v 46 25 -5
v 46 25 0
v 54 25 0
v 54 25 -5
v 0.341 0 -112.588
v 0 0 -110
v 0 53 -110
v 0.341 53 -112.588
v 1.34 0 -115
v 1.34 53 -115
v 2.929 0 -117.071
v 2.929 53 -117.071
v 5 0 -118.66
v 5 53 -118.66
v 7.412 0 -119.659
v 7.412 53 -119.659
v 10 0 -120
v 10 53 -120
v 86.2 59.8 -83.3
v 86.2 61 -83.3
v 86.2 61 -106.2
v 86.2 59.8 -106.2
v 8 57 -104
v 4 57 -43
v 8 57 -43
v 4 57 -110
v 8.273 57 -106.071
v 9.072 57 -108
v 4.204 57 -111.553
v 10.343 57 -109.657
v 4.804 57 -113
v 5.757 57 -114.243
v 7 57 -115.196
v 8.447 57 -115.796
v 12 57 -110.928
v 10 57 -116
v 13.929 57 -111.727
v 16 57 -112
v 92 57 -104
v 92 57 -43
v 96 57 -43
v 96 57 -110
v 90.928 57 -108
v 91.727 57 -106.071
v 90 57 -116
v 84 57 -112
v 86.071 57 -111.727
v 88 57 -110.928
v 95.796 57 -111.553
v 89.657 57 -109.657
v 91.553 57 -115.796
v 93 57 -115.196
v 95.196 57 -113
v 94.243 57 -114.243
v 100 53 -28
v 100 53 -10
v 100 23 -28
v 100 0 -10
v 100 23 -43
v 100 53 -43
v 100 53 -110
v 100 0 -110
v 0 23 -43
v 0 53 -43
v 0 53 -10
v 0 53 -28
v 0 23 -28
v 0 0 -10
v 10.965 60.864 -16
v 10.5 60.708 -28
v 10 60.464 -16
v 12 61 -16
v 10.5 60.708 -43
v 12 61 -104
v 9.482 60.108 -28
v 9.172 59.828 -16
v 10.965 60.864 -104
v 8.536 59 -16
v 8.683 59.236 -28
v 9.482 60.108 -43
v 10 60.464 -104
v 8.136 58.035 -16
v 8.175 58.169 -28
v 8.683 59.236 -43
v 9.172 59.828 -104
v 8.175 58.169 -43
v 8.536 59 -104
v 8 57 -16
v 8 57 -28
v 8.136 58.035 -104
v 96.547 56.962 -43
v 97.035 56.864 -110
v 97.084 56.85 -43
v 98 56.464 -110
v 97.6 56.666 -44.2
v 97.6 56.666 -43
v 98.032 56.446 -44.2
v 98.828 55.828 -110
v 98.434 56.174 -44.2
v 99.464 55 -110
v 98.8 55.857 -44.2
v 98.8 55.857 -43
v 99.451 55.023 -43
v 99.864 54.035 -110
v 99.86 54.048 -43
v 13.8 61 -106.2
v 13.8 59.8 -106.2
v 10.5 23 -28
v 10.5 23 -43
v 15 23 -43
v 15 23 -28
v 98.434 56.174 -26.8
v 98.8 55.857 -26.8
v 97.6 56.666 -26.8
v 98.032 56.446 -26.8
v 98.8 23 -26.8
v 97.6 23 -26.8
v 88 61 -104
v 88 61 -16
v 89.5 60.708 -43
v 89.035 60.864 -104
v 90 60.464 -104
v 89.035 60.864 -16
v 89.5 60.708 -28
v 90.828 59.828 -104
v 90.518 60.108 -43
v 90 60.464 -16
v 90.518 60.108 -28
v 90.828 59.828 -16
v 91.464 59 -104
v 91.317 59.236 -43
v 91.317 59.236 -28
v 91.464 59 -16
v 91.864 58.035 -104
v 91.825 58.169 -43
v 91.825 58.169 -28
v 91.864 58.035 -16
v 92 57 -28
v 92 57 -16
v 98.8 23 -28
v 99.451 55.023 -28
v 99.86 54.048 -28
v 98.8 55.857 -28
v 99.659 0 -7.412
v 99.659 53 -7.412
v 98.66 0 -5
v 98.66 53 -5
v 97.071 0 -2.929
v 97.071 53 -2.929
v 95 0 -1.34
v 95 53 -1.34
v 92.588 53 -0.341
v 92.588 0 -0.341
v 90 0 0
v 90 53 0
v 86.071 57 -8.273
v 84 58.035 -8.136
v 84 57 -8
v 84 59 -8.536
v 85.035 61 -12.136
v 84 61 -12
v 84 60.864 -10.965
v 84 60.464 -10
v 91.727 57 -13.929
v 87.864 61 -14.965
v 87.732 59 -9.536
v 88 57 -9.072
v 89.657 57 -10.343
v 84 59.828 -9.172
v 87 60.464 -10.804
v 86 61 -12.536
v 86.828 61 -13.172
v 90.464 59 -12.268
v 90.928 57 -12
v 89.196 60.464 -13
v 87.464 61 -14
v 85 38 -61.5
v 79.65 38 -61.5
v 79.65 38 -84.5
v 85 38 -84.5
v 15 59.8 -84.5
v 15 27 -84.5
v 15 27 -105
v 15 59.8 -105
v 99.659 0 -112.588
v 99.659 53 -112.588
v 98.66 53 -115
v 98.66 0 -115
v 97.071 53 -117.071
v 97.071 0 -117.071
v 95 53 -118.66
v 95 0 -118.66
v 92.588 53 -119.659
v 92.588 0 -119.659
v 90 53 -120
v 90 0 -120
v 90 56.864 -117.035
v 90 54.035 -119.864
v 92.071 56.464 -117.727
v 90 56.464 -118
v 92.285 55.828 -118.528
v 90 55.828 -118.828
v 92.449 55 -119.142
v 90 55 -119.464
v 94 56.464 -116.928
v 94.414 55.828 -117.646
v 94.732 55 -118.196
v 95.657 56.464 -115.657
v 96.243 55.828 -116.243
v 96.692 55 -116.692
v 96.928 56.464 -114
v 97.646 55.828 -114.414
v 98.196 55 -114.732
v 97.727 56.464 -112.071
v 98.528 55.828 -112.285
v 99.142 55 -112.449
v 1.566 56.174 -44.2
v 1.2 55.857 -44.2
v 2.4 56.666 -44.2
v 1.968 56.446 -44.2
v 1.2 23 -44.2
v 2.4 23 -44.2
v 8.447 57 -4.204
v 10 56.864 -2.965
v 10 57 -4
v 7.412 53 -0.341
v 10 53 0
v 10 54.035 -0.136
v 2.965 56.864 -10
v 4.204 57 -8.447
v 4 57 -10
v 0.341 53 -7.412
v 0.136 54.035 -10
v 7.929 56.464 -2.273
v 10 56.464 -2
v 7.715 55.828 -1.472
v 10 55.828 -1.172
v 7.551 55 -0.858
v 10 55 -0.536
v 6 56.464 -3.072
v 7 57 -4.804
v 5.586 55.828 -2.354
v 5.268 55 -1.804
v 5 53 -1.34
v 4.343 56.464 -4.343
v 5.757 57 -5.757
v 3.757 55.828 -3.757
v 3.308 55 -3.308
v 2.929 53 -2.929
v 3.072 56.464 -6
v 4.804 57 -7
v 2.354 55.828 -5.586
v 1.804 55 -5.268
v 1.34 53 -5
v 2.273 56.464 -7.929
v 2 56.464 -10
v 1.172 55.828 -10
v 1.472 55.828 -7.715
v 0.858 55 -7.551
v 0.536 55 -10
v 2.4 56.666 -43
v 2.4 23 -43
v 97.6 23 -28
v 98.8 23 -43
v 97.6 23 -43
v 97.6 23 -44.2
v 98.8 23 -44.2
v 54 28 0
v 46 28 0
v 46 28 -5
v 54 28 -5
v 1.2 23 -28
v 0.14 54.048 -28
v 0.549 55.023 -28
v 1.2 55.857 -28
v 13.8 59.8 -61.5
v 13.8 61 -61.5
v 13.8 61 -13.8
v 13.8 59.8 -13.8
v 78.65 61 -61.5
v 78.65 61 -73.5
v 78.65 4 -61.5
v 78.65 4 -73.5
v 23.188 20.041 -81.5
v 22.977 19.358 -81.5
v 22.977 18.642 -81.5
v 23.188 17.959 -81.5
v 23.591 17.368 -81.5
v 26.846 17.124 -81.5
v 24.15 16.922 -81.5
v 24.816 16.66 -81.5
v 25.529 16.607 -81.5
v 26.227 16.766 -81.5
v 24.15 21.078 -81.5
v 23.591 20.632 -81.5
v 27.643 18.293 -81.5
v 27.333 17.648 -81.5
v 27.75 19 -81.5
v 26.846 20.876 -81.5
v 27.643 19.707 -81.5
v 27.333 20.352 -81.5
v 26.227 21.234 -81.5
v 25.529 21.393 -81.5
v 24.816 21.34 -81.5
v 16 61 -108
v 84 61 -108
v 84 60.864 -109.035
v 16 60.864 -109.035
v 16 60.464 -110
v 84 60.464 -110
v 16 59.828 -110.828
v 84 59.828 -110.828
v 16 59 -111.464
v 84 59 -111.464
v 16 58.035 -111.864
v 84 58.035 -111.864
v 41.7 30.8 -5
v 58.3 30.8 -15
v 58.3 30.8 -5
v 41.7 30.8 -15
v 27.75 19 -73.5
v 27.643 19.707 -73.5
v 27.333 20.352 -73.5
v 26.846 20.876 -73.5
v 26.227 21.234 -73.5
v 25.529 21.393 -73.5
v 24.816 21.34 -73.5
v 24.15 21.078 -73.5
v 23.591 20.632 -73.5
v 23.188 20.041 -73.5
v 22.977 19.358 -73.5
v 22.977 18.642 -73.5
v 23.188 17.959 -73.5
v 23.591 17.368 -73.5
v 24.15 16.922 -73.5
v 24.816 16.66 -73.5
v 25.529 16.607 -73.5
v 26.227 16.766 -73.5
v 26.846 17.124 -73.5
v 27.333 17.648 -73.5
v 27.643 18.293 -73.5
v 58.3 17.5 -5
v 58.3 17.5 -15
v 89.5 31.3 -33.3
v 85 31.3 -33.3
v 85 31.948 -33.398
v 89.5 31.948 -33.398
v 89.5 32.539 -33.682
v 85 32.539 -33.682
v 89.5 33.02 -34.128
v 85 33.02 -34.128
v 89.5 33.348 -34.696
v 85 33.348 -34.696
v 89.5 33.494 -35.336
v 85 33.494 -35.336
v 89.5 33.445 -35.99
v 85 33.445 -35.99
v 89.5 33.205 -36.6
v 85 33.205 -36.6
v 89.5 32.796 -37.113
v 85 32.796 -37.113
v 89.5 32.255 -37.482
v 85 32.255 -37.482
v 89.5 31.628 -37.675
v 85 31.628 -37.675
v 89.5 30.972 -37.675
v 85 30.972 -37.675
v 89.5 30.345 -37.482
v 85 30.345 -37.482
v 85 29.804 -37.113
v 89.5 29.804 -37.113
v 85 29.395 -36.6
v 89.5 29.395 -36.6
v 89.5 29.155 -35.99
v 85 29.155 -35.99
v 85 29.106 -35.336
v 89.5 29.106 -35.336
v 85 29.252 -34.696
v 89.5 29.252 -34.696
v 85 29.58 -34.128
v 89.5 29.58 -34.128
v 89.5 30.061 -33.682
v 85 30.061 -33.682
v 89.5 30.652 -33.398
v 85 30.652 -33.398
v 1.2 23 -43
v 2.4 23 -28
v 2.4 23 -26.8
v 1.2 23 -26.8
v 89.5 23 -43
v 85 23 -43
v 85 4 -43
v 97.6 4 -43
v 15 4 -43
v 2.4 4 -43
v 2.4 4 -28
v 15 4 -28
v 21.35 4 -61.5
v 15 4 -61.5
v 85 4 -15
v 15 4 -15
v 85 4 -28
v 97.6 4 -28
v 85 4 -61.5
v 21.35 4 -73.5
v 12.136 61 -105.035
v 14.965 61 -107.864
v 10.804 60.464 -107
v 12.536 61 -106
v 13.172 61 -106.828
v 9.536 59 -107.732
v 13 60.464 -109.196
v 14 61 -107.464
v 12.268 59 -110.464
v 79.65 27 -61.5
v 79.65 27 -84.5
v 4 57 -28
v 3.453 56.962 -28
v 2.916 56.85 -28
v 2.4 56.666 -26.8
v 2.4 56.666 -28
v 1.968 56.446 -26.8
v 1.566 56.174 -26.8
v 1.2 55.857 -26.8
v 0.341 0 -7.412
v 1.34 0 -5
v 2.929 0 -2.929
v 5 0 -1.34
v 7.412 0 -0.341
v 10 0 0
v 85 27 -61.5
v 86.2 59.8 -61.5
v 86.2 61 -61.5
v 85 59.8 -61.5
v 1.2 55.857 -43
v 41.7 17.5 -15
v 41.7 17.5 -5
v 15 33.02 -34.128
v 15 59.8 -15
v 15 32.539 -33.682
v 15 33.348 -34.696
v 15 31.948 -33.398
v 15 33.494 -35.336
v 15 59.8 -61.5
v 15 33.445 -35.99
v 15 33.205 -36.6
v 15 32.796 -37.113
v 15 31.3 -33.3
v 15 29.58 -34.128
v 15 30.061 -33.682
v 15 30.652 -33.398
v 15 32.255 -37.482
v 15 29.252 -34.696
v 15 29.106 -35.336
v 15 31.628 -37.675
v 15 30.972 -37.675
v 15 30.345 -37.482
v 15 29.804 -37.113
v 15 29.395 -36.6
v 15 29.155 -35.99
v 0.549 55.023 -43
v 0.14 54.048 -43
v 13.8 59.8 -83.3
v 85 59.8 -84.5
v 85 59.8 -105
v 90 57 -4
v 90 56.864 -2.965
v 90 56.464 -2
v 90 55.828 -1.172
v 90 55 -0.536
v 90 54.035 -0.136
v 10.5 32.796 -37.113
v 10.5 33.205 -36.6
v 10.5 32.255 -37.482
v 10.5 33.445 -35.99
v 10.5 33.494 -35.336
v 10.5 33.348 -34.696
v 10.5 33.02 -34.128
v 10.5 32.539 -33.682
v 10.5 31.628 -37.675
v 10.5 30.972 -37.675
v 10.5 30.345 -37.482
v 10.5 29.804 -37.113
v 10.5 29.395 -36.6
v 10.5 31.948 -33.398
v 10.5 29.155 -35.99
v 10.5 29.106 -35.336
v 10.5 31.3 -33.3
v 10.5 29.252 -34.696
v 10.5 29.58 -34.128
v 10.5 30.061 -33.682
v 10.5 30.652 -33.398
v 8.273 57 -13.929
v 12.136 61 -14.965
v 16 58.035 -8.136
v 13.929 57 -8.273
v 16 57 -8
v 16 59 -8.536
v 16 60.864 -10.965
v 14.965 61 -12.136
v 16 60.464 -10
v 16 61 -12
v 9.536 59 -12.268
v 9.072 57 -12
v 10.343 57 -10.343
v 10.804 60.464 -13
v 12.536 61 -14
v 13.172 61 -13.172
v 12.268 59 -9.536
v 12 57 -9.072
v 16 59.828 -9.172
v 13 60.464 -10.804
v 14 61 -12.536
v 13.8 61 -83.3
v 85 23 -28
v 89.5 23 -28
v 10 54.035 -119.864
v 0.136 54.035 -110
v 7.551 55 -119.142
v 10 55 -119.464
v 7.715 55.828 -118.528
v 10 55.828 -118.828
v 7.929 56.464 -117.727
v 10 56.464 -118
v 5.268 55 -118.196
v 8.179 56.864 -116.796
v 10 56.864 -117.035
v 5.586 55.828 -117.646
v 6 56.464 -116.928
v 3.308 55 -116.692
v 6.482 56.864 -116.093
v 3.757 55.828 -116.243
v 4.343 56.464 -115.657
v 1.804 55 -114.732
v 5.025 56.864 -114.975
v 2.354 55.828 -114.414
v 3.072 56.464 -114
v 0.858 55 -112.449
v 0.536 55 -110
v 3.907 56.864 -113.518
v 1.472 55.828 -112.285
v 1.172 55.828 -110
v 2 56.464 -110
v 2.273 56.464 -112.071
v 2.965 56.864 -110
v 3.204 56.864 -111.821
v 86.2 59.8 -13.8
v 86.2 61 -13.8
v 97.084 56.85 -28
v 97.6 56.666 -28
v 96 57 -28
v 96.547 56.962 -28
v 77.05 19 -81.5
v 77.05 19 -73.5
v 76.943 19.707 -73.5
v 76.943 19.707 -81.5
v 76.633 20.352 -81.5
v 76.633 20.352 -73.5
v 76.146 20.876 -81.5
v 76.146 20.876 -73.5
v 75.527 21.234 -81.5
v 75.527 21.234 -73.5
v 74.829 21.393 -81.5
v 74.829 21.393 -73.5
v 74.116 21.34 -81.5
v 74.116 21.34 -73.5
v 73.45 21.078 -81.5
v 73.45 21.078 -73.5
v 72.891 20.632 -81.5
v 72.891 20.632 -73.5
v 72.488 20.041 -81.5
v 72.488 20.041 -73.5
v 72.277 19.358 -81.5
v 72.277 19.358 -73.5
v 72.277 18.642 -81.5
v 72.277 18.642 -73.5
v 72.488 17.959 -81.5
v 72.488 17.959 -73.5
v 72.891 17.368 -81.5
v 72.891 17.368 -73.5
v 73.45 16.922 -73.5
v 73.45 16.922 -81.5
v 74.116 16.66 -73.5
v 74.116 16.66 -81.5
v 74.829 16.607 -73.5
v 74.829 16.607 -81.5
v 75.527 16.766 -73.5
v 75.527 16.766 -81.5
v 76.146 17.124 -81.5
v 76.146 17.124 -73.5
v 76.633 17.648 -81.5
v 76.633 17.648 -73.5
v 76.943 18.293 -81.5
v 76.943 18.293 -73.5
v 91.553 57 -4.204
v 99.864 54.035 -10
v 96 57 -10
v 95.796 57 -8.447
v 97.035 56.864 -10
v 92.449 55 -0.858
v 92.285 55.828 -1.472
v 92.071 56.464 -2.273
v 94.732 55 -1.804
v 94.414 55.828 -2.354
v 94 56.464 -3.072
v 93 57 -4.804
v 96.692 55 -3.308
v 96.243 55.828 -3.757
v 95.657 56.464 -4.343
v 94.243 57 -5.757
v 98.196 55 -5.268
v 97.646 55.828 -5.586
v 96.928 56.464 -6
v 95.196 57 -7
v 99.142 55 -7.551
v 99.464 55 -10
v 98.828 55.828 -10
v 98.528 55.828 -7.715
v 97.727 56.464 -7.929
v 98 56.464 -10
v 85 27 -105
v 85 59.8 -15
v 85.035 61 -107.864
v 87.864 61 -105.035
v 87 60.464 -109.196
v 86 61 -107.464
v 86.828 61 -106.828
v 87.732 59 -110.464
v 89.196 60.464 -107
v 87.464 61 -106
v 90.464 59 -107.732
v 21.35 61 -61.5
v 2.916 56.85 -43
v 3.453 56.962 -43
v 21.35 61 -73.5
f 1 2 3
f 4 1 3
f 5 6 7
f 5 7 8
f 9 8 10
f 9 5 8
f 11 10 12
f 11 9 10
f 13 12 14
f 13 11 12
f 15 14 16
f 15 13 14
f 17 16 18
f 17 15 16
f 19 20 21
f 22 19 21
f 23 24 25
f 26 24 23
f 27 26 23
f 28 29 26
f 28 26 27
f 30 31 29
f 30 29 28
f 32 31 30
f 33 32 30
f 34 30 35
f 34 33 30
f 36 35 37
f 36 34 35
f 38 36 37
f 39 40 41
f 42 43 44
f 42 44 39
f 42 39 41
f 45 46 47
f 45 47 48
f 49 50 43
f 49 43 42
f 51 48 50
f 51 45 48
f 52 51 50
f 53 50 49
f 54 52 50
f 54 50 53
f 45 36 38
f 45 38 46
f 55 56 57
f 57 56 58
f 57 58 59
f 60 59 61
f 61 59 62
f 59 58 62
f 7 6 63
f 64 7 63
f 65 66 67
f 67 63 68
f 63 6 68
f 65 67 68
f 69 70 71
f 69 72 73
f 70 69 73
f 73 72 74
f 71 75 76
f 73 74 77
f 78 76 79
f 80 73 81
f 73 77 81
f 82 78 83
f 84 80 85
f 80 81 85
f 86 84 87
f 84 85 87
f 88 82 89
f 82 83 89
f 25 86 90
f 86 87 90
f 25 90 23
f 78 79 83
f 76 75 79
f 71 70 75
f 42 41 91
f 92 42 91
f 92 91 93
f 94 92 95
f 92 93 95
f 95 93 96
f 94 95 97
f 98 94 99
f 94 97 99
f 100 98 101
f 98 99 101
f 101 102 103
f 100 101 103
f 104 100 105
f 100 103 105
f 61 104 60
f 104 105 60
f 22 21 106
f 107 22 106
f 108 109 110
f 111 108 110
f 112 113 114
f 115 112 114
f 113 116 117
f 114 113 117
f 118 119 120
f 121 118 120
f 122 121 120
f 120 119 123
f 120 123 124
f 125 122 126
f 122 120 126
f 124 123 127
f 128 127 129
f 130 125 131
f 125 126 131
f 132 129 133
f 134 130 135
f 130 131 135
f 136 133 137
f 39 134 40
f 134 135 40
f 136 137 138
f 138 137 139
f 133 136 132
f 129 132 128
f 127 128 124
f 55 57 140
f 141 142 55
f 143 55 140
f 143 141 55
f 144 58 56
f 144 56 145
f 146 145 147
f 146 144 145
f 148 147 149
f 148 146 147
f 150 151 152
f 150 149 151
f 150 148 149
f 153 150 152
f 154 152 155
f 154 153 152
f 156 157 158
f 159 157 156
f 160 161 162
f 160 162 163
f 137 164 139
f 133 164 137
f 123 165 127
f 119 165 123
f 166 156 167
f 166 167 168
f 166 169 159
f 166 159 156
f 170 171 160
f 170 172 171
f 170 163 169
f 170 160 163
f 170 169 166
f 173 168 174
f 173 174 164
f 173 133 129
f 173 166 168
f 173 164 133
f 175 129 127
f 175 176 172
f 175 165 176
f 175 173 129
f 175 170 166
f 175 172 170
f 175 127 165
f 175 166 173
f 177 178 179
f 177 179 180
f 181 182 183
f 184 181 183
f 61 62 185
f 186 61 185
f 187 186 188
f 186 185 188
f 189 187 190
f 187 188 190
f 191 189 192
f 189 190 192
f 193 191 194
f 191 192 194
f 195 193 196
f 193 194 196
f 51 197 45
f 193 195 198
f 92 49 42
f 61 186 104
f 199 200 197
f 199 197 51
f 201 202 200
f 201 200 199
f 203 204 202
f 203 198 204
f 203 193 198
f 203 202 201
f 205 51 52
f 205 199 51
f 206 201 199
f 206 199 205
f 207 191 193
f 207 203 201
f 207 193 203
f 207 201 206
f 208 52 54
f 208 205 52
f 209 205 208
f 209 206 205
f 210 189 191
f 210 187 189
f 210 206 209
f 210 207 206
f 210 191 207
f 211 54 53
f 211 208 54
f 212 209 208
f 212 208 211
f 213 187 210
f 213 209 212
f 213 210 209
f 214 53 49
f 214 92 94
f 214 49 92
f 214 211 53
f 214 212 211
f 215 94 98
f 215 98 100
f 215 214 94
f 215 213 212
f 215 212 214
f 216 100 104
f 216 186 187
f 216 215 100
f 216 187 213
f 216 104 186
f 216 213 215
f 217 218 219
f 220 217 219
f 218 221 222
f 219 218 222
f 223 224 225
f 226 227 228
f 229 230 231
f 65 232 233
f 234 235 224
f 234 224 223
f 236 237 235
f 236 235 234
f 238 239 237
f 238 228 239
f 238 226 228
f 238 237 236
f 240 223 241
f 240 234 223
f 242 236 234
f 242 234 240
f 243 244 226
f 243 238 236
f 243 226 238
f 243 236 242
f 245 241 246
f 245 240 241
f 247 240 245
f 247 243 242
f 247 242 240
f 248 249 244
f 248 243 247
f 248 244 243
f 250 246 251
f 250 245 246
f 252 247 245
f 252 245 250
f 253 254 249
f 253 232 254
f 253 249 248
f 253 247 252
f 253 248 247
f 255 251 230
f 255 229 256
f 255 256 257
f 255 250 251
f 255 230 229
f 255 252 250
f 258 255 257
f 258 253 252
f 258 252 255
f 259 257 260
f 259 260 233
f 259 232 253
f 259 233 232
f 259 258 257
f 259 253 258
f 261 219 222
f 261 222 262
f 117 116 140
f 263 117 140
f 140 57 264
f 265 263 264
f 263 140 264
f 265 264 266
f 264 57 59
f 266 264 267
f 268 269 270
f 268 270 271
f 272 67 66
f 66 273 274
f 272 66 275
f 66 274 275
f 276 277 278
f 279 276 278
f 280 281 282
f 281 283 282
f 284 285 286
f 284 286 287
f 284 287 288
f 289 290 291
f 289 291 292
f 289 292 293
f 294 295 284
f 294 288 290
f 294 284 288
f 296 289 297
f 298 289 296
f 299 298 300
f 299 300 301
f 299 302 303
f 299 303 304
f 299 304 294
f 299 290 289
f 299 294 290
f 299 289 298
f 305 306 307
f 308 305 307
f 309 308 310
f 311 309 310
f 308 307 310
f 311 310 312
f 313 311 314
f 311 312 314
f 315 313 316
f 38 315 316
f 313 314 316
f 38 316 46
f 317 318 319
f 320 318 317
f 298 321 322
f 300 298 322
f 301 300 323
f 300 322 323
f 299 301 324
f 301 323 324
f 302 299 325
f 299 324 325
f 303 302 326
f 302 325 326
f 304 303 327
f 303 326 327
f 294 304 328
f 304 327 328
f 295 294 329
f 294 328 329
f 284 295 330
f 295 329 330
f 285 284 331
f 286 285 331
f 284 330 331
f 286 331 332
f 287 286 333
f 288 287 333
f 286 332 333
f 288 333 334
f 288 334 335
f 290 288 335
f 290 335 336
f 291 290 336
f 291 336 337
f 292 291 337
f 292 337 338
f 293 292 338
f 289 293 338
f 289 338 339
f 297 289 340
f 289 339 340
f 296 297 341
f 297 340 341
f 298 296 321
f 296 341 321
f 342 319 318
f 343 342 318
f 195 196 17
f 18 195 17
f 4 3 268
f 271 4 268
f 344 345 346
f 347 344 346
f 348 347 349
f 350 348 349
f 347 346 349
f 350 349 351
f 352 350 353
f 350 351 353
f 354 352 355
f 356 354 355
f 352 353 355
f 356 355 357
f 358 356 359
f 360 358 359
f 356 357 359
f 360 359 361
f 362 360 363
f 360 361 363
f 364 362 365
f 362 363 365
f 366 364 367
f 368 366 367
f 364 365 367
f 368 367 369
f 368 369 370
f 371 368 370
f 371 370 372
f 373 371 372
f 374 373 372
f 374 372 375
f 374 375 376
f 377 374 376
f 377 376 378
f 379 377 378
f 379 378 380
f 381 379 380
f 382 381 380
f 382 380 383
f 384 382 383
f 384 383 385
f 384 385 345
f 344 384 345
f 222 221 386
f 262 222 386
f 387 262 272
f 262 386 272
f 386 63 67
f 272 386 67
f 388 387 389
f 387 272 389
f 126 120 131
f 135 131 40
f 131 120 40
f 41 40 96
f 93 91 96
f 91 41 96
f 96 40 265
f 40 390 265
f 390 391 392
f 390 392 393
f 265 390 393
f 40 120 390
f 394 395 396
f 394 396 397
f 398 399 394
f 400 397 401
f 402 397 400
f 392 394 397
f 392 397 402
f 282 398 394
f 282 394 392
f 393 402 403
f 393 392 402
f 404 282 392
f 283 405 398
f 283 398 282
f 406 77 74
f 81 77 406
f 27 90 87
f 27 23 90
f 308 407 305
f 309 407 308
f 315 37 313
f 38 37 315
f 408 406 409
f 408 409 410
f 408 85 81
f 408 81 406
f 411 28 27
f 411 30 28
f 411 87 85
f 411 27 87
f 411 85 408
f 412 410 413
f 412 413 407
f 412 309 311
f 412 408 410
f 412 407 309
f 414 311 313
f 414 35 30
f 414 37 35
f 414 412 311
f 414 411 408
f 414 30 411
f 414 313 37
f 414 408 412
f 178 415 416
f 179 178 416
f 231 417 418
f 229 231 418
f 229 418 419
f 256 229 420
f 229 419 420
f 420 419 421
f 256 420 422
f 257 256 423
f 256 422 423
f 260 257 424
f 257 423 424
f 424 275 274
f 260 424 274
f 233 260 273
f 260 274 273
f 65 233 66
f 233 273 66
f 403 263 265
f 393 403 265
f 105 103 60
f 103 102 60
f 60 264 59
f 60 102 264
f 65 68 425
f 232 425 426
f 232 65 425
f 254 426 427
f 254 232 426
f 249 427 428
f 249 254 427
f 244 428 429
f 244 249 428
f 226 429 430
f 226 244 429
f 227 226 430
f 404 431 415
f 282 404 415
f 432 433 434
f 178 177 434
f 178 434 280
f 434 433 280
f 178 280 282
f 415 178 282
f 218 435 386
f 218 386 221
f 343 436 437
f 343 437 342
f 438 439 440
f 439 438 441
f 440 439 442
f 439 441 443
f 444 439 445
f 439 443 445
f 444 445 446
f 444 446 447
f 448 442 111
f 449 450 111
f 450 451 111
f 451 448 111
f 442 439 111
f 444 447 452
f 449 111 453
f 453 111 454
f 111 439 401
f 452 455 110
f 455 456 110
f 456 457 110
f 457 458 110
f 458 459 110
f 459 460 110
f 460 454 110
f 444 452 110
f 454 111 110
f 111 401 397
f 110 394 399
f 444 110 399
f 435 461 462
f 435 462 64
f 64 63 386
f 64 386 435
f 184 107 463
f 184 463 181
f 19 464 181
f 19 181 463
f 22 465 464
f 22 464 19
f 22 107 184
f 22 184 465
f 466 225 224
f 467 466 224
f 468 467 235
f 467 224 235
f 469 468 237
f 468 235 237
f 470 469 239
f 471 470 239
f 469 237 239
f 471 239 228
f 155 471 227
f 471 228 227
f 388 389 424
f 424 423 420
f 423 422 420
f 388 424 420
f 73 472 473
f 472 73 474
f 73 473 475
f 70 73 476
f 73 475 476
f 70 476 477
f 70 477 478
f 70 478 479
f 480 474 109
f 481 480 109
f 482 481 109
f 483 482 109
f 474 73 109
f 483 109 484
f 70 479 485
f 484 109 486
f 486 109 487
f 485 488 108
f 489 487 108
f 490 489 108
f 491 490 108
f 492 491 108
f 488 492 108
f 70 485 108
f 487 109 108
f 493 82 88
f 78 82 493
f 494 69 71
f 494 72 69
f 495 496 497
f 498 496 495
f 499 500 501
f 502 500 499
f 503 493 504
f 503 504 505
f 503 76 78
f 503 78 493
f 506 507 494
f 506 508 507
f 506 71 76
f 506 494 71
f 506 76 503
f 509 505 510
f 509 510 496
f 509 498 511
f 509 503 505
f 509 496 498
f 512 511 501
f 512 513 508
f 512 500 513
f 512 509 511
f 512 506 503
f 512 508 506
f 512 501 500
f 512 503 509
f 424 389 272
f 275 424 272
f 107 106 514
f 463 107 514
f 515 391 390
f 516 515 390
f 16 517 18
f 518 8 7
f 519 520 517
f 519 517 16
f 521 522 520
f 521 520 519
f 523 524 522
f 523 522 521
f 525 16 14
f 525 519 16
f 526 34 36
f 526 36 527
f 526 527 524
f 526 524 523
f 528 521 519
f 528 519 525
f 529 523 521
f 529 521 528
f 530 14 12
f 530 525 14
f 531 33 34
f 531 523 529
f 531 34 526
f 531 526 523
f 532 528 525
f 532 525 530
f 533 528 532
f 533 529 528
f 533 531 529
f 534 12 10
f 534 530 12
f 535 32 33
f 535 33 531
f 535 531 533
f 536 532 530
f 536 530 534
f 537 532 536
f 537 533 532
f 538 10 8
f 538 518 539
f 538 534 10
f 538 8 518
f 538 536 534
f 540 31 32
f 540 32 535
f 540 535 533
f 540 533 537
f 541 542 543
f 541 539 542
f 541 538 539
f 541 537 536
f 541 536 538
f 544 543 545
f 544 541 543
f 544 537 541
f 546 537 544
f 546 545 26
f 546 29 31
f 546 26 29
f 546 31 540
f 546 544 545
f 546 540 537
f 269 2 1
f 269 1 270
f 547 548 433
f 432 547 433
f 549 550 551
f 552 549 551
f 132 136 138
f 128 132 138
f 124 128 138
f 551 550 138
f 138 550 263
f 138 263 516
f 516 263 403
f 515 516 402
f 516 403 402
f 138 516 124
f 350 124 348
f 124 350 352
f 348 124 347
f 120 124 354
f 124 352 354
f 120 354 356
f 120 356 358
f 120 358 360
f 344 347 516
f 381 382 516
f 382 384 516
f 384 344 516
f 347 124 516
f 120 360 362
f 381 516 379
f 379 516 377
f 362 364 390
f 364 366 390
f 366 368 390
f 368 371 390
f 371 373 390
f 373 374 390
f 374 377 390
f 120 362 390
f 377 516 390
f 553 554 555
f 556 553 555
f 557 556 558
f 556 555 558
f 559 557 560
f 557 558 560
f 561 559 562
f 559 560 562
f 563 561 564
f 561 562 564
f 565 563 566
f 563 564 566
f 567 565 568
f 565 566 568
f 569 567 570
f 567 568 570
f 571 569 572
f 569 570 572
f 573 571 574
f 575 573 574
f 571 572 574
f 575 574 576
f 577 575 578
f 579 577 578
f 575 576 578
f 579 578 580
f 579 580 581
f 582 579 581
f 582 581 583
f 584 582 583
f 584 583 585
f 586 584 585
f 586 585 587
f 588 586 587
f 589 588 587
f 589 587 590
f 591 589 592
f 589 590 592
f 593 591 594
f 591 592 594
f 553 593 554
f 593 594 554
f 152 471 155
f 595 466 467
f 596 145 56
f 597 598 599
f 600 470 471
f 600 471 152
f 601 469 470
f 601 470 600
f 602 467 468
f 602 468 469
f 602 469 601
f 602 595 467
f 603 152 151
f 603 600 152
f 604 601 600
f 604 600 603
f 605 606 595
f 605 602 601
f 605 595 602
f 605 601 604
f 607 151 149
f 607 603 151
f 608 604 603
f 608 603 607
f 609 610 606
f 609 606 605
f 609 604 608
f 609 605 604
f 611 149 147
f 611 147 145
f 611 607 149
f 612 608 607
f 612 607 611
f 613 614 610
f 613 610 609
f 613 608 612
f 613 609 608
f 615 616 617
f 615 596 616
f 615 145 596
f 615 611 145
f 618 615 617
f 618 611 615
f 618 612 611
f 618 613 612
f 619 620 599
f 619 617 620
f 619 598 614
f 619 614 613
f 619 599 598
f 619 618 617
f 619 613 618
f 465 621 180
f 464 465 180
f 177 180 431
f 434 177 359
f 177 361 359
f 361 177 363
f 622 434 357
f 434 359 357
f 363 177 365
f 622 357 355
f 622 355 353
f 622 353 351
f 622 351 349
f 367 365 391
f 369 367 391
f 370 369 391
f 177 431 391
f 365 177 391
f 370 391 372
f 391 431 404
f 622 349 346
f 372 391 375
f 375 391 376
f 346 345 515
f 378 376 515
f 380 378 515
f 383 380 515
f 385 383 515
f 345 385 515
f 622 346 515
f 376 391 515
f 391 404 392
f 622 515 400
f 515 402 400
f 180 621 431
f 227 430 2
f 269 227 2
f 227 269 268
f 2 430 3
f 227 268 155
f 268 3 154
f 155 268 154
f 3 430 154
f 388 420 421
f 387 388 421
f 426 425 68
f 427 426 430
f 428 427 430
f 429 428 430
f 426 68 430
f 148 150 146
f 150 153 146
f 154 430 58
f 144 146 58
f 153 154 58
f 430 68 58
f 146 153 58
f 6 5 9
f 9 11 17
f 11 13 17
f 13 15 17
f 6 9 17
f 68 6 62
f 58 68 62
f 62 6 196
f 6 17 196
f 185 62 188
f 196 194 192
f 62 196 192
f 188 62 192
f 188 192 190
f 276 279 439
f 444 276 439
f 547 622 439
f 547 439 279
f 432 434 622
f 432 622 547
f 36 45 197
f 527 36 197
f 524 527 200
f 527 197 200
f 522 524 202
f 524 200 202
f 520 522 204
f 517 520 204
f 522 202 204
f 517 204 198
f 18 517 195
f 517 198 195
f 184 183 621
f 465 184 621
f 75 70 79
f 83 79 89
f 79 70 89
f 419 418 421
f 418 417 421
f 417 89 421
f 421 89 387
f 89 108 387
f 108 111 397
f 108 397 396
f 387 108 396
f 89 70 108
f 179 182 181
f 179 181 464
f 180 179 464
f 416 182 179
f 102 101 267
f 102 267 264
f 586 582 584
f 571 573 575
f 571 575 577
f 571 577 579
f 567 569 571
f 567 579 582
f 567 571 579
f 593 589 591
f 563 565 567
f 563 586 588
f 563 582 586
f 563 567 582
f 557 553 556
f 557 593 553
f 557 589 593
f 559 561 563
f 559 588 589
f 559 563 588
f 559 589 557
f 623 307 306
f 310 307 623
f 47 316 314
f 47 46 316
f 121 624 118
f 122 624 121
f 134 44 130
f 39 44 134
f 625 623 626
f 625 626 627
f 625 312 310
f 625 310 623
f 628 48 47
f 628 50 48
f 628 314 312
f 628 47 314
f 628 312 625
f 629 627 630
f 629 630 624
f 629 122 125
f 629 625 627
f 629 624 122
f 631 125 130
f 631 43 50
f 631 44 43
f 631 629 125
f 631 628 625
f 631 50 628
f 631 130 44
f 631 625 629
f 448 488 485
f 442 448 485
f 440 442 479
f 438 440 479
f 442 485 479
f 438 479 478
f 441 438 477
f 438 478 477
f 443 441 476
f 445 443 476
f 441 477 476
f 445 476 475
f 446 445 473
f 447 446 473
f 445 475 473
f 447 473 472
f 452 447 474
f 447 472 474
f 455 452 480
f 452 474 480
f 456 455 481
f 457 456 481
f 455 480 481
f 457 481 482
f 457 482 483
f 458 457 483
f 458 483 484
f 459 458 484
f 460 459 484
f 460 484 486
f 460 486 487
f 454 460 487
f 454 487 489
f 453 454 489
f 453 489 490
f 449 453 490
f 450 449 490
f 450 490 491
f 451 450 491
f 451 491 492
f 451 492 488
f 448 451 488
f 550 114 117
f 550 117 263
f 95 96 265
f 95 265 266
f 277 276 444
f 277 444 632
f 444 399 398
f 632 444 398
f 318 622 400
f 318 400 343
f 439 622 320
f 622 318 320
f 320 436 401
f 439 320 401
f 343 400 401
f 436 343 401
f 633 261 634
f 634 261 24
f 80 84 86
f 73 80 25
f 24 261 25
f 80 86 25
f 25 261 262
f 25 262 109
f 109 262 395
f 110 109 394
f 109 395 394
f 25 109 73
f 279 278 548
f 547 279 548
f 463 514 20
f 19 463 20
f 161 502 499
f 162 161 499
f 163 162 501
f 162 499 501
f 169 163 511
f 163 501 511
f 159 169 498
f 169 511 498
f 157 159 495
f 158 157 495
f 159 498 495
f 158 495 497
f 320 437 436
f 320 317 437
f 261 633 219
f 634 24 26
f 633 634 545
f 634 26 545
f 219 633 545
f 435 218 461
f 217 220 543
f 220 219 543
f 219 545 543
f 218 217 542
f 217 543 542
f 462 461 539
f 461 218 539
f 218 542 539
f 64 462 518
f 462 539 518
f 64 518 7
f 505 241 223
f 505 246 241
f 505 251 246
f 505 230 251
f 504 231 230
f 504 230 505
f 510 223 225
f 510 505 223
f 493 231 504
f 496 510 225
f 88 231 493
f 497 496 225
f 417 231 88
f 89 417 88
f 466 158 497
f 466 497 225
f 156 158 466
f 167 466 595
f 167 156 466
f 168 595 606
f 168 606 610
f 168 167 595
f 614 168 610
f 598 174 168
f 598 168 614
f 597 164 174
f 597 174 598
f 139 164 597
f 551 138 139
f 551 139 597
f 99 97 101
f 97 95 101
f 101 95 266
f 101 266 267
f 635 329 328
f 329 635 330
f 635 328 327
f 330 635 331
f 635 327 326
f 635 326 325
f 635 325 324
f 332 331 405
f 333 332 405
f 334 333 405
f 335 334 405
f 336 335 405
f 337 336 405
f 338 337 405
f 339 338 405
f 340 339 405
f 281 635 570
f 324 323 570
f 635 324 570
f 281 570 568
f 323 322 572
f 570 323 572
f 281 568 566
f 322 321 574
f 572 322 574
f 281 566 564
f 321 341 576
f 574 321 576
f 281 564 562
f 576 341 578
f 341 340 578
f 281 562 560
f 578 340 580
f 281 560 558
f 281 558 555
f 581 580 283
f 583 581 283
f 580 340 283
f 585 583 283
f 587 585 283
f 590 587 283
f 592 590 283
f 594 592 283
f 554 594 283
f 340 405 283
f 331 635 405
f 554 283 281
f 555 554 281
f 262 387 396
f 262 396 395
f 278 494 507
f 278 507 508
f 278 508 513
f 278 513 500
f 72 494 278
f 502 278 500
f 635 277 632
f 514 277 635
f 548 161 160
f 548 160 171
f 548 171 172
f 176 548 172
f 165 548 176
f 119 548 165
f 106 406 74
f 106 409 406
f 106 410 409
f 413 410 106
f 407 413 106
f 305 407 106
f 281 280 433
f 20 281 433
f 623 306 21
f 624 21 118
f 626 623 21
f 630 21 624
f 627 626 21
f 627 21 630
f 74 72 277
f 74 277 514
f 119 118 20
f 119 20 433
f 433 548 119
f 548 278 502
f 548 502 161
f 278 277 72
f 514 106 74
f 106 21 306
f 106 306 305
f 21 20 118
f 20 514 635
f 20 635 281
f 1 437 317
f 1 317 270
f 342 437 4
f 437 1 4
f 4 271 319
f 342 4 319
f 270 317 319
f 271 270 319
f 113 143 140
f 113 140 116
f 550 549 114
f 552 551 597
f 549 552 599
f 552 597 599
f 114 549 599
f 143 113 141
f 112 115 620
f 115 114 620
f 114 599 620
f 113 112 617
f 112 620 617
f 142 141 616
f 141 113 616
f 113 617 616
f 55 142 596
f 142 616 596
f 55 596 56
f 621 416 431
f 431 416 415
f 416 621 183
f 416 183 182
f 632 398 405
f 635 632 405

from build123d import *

# Parameters (mm, degrees)
SKICA2_W                  = 100
SKICA2_H                  = 120
P_IDAT_VYSUNUT_M1_DEPTH   = 4
SKICA3_W                  = 15
SKICA3_H                  = 15
SKICA3_W_2                = 70
SKICA3_W_3                = 57.3
SKICA3_H_2                = 3
P_IDAT_VYSUNUT_M2_DEPTH   = 50
SKICA4_W                  = 70
SKICA4_H                  = 20.5
P_IDAT_VYSUNUT_M3_DEPTH   = 23
SKICA8_W                  = 6.35
SKICA8_H                  = 6
ODEBRAT_VYSUNUT_M1_DEPTH  = 23
SKICA9_W                  = 6.35
SKICA9_H                  = 2
P_IDAT_VYSUNUT_M5_DEPTH   = 6
SKICA10_R                 = 2.4
ODEBRAT_VYSUNUT_M2_DEPTH  = 8
SKICA11_W                 = 16.6
SKICA11_H                 = 11.8
ODEBRAT_VYSUNUT_M5_DEPTH  = 10
SKICA14_W                 = 8
SKICA14_H                 = 3
ODEBRAT_VYSUNUT_M6_DEPTH  = 5
SKICA15_W                 = 100
SKICA15_H                 = 120
SKICA15_W_2               = 84
SKICA15_H_2               = 104
ODEBRAT_VYSUNUT_M7_DEPTH  = 4
SKICA20_W                 = 15
SKICA20_H                 = 31
ODEBRAT_VYSUNUT_M8_DEPTH  = 10
SKICA21_W                 = 15
SKICA21_H                 = 31
ODEBRAT_VYSUNUT_M10_DEPTH = 10
SKICA22_R                 = 2.2
ODEBRAT_VYSUNUT_M11_DEPTH = 3
ODEBRAT_START             = -3
SKICA23_R                 = 2.2
ODEBRAT_VYSUNUT_M12_DEPTH = 3
SKICA24_W                 = 1.2
SKICA24_H                 = 1.2
ODEBRAT_VYSUNUT_M14_DEPTH = 27
SKICA26_W                 = 12.6
SKICA26_H                 = 15
ODEBRAT_VYSUNUT_M16_DEPTH = 19
SKICA32_R                 = 2.2
ODEBRAT_VYSUNUT_M19_DEPTH = 158.749801902
SKICA33_W                 = 2
SKICA33_H                 = 6
ODEBRAT_VYSUNUT_M20_DEPTH = 6.35
SKICA35_W                 = 16.6
SKICA35_H                 = 10
ODEBRAT_VYSUNUT_M21_DEPTH = 1.5
SKICA38_W                 = 1
SKICA38_H                 = 23
P_IDAT_VYSUNUT_M9_DEPTH   = 15
SKICA39_W                 = 5.35
SKICA39_H                 = 5
ODEBRAT_VYSUNUT_M23_DEPTH = 23
SKICA40_W                 = 15
SKICA40_H                 = 31
ODEBRAT_VYSUNUT_M24_DEPTH = 0.5
SKICA41_W                 = 15
SKICA41_H                 = 31
ODEBRAT_VYSUNUT_M25_DEPTH = 0.5
SKICA43_W                 = 70
SKICA43_H                 = 20.5
P_IDAT_VYSUNUT_M10_DEPTH  = 7
P_IDAT_VYSUNUT_M11_DEPTH  = 7
SKICA45_W                 = 70
SKICA45_H                 = 1.2
SKICA45_H_2               = 20.5
SKICA45_W_2               = 1.2
SKICA45_H_3               = 46.5
ODEBRAT_VYSUNUT_M26_DEPTH = 1.2
ZAOBLIT1_R                = 10
ZAOBLIT2_R                = 8
ZAOBLIT3_R                = 4


with BuildPart() as part:
    # Skica2 → Přidat vysunutím1 (new body)
    with BuildSketch(Plane(origin=(0, 0, 0), x_dir=(1, 0, 0), z_dir=(0, 1, 0))):
        with Locations((50, 60)):
            Rectangle(SKICA2_W, SKICA2_H)
    extrude(amount=P_IDAT_VYSUNUT_M1_DEPTH)

    # Skica3 → Přidat vysunutím2 (add)
    with BuildSketch(Plane(origin=(0, 4, 0), x_dir=(1, 0, 0), z_dir=(0, 1, 0))):
        with Locations((7.5, 112.5)):
            Rectangle(SKICA3_W, SKICA3_H)
        with Locations((50, 112.5)):
            Rectangle(SKICA3_W_2, SKICA3_H)
        Polygon((15, 105), (0, 105), (0, 15), (15, 15), (15, 61.5), (15, 76.5), (15, 84.5), align=None)
        with Locations((92.5, 112.5)):
            Rectangle(SKICA3_W, SKICA3_H)
        Polygon((100, 105), (85, 105), (85, 84.5), (85, 76.5), (85, 61.5), (85, 15), (100, 15), align=None)
        Polygon((85, 84.5), (15, 84.5), (15, 76.5), (21.35, 76.5), (78.65, 76.5), (85, 76.5), align=None)
        with Locations((7.5, 7.5)):
            Rectangle(SKICA3_W, SKICA3_H)
        with Locations((50, 7.5)):
            Rectangle(SKICA3_W_2, SKICA3_H)
        with Locations((92.5, 7.5)):
            Rectangle(SKICA3_W, SKICA3_H)
        Polygon((21.35, 76.5), (15, 76.5), (15, 61.5), (21.35, 61.5), (21.35, 73.5), align=None)
        with Locations((50, 75)):
            Rectangle(SKICA3_W_3, SKICA3_H_2)
        Polygon((85, 61.5), (85, 76.5), (78.65, 76.5), (78.65, 73.5), (78.65, 61.5), align=None)
    extrude(amount=P_IDAT_VYSUNUT_M2_DEPTH)

    # Skica4 → Přidat vysunutím3 (add)
    with BuildSketch(Plane(origin=(0, 4, 0), x_dir=(1, 0, 0), z_dir=(0, 1, 0))):
        with Locations((50, 94.75)):
            Rectangle(SKICA4_W, SKICA4_H)
    extrude(amount=P_IDAT_VYSUNUT_M3_DEPTH)

    # Skica8 → Odebrat vysunutím1 (cut)
    with BuildSketch(Plane.XY.offset(-61.5)):
        with Locations((81.825, 30)):
            Rectangle(SKICA8_W, SKICA8_H)
    extrude(amount=-ODEBRAT_VYSUNUT_M1_DEPTH, mode=Mode.SUBTRACT)

    # Skica9 → Přidat vysunutím5 (add)
    with BuildSketch(Plane(origin=(0, 27, 0), x_dir=(1, 0, 0), z_dir=(0, 1, 0))):
        with Locations((81.825, 62.5)):
            Rectangle(SKICA9_W, SKICA9_H)
    extrude(amount=P_IDAT_VYSUNUT_M5_DEPTH)

    # Skica10 → Odebrat vysunutím2 (cut)
    with BuildSketch(Plane.XY.offset(-73.5)):
        with Locations((25.35, 19)):
            Circle(SKICA10_R)
        with Locations((74.65, 19)):
            Circle(SKICA10_R)
    extrude(amount=-ODEBRAT_VYSUNUT_M2_DEPTH, mode=Mode.SUBTRACT)

    # Skica11 → Odebrat vysunutím5 (cut)
    with BuildSketch(Plane(origin=(0, 0, -15), x_dir=(-1, 0, 0), z_dir=(0, 0, -1))):
        with Locations((-50, 24.9)):
            Rectangle(SKICA11_W, SKICA11_H)
    extrude(amount=-ODEBRAT_VYSUNUT_M5_DEPTH, mode=Mode.SUBTRACT)

    # Skica14 → Odebrat vysunutím6 (cut)
    with BuildSketch(Plane.XY):
        with Locations((50, 26.5)):
            Rectangle(SKICA14_W, SKICA14_H)
    extrude(amount=-ODEBRAT_VYSUNUT_M6_DEPTH, mode=Mode.SUBTRACT)

    # Skica15 → Odebrat vysunutím7 (cut)
    with BuildSketch(Plane(origin=(0, 54, 0), x_dir=(1, 0, 0), z_dir=(0, 1, 0))):
        with Locations((50, 60)):
            Rectangle(SKICA15_W, SKICA15_H)
        with Locations((50, 60)):
            Rectangle(SKICA15_W_2, SKICA15_H_2, mode=Mode.SUBTRACT)
    extrude(amount=-ODEBRAT_VYSUNUT_M7_DEPTH, mode=Mode.SUBTRACT)

    # Skica20 → Odebrat vysunutím8 (cut)
    with BuildSketch(Plane.ZY):
        with Locations((-35.5, 38.5)):
            Rectangle(SKICA20_W, SKICA20_H)
    extrude(amount=-ODEBRAT_VYSUNUT_M8_DEPTH, mode=Mode.SUBTRACT)

    # Skica21 → Odebrat vysunutím10 (cut)
    with BuildSketch(Plane(origin=(100, 0, 0), x_dir=(0, 0, -1), z_dir=(1, 0, 0))):
        with Locations((35.5, 38.5)):
            Rectangle(SKICA21_W, SKICA21_H)
    extrude(amount=-ODEBRAT_VYSUNUT_M10_DEPTH, mode=Mode.SUBTRACT)

    # Skica22 → Odebrat vysunutím11 (cut)
    with BuildSketch(Plane.ZY.offset(-10)):
        with Locations((-35.5, 31.3)):
            Circle(SKICA22_R)
    extrude(amount=-ODEBRAT_VYSUNUT_M11_DEPTH, mode=Mode.SUBTRACT)

    # Skica23 → Odebrat vysunutím12 (cut)
    with BuildSketch(Plane(origin=(90, 0, 0), x_dir=(0, 0, -1), z_dir=(1, 0, 0)).offset(ODEBRAT_START)):
        with Locations(Location((35.5, 31.3, 0), (0, 0, 180))):
            Circle(SKICA23_R)
    extrude(amount=ODEBRAT_VYSUNUT_M12_DEPTH, mode=Mode.SUBTRACT)

    # Skica24 → Odebrat vysunutím14 (cut)
    with BuildSketch(Plane(origin=(0, 50, 0), x_dir=(1, 0, 0), z_dir=(0, 1, 0))):
        with Locations((1.8, 27.4)):
            Rectangle(SKICA24_W, SKICA24_H)
        with Locations((1.8, 43.6)):
            Rectangle(SKICA24_W, SKICA24_H)
        with Locations((98.2, 27.4)):
            Rectangle(SKICA24_W, SKICA24_H)
        with Locations((98.2, 43.6)):
            Rectangle(SKICA24_W, SKICA24_H)
    extrude(amount=-ODEBRAT_VYSUNUT_M14_DEPTH, mode=Mode.SUBTRACT)

    # Skica26 → Odebrat vysunutím16 (cut)
    with BuildSketch(Plane(origin=(0, 23, 0), x_dir=(1, 0, 0), z_dir=(0, 1, 0))):
        with Locations((8.7, 35.5)):
            Rectangle(SKICA26_W, SKICA26_H)
        with Locations((91.3, 35.5)):
            Rectangle(SKICA26_W, SKICA26_H)
    extrude(amount=-ODEBRAT_VYSUNUT_M16_DEPTH, mode=Mode.SUBTRACT)

    # Skica32 → Odebrat vysunutím19 (cut, through all)
    with BuildSketch(Plane.ZY.offset(-13)):
        with Locations((-35.5, 31.3)):
            Circle(SKICA32_R)
    extrude(amount=-ODEBRAT_VYSUNUT_M19_DEPTH, mode=Mode.SUBTRACT)

    # Skica33 → Odebrat vysunutím20 (cut)
    with BuildSketch(Plane.ZY.offset(-78.65)):
        with Locations((-62.5, 30)):
            Rectangle(SKICA33_W, SKICA33_H)
    extrude(amount=-ODEBRAT_VYSUNUT_M20_DEPTH, mode=Mode.SUBTRACT)

    # Skica35 → Odebrat vysunutím21 (cut)
    with BuildSketch(Plane(origin=(0, 19, 0), x_dir=(1, 0, 0), z_dir=(0, 1, 0))):
        with Locations((50, 10)):
            Rectangle(SKICA35_W, SKICA35_H)
    extrude(amount=-ODEBRAT_VYSUNUT_M21_DEPTH, mode=Mode.SUBTRACT)

    # Skica38 → Přidat vysunutím9 (add)
    with BuildSketch(Plane(origin=(0, 27, 0), x_dir=(1, 0, 0), z_dir=(0, 1, 0))):
        with Locations((79.15, 73)):
            Rectangle(SKICA38_W, SKICA38_H)
    extrude(amount=P_IDAT_VYSUNUT_M9_DEPTH)

    # Skica39 → Odebrat vysunutím23 (cut)
    with BuildSketch(Plane.XY.offset(-61.5)):
        with Locations((82.325, 35.5)):
            Rectangle(SKICA39_W, SKICA39_H)
    extrude(amount=-ODEBRAT_VYSUNUT_M23_DEPTH, mode=Mode.SUBTRACT)

    # Skica40 → Odebrat vysunutím24 (cut)
    with BuildSketch(Plane.ZY.offset(-10)):
        with Locations((-35.5, 38.5)):
            Rectangle(SKICA40_W, SKICA40_H)
    extrude(amount=-ODEBRAT_VYSUNUT_M24_DEPTH, mode=Mode.SUBTRACT)

    # Skica41 → Odebrat vysunutím25 (cut)
    with BuildSketch(Plane(origin=(90, 0, 0), x_dir=(0, 0, -1), z_dir=(1, 0, 0))):
        with Locations((35.5, 38.5)):
            Rectangle(SKICA41_W, SKICA41_H)
    extrude(amount=-ODEBRAT_VYSUNUT_M25_DEPTH, mode=Mode.SUBTRACT)

    # Skica43 → Přidat vysunutím10 (add)
    with BuildSketch(Plane(origin=(0, 54, 0), x_dir=(1, 0, 0), z_dir=(0, 1, 0))):
        Polygon((92, 8), (92, 28), (89.5, 28), (89.5, 43), (92, 43), (92, 112), (8, 112), (8, 43), (10.5, 43), (10.5, 28), (8, 28), (8, 8), align=None)
        with Locations((50, 94.75)):
            Rectangle(SKICA43_W, SKICA43_H, mode=Mode.SUBTRACT)
        Polygon((78.65, 73.5), (78.65, 61.5), (85, 61.5), (85, 15), (15, 15), (15, 61.5), (21.35, 61.5), (21.35, 73.5), align=None, mode=Mode.SUBTRACT)
    extrude(amount=P_IDAT_VYSUNUT_M10_DEPTH)

    # Skica44 → Přidat vysunutím11 (add)
    with BuildSketch(Plane(origin=(0, 50, 0), x_dir=(1, 0, 0), z_dir=(0, 1, 0))):
        Polygon((0, 120), (0, 43), (1.2, 43), (1.2, 44.2), (2.4, 44.2), (2.4, 43), (8, 43), (8, 112), (92, 112), (92, 43), (97.6, 43), (97.6, 44.2), (98.8, 44.2), (98.8, 43), (100, 43), (100, 120), align=None)
        Polygon((1.2, 28), (0, 28), (0, 0), (100, 0), (100, 28), (98.8, 28), (98.8, 26.8), (97.6, 26.8), (97.6, 28), (92, 28), (92, 8), (8, 8), (8, 28), (2.4, 28), (2.4, 26.8), (1.2, 26.8), align=None)
    extrude(amount=P_IDAT_VYSUNUT_M11_DEPTH)

    # Skica45 → Odebrat vysunutím26 (cut)
    with BuildSketch(Plane(origin=(0, 61, 0), x_dir=(1, 0, 0), z_dir=(0, 1, 0))):
        with Locations((50, 105.6)):
            Rectangle(SKICA45_W, SKICA45_H)
        Polygon((15, 84.5), (15, 105), (15, 106.2), (13.8, 106.2), (13.8, 84.5), align=None)
        with Locations((50, 94.75)):
            Rectangle(SKICA45_W, SKICA45_H_2)
        Polygon((85, 106.2), (85, 105), (85, 84.5), (85, 83.3), (86.2, 83.3), (86.2, 106.2), align=None)
        Polygon((85, 84.5), (15, 84.5), (13.8, 84.5), (13.8, 83.3), (85, 83.3), align=None)
        Polygon((85, 15), (15, 15), (13.8, 15), (13.8, 13.8), (85, 13.8), align=None)
        with Locations((14.4, 38.25)):
            Rectangle(SKICA45_W_2, SKICA45_H_3)
        Polygon((85, 61.5), (85, 15), (85, 13.8), (86.2, 13.8), (86.2, 61.5), align=None)
    extrude(amount=-ODEBRAT_VYSUNUT_M26_DEPTH, mode=Mode.SUBTRACT)

    # Zaoblit1
    zaoblit1_edges = [part.edges().sort_by_distance(p)[0] for p in [
        (0, 28.5, -120),
        (100, 28.5, -120),
        (100, 28.5, 0),
        (0, 28.5, 0),
    ]]
    fillet(zaoblit1_edges, radius=ZAOBLIT1_R)

    # Zaoblit2
    zaoblit2_edges = [part.edges().sort_by_distance(p)[0] for p in [
        (92, 59, -8),
        (8, 59, -8),
        (8, 59, -112),
        (92, 59, -112),
    ]]
    fillet(zaoblit2_edges, radius=ZAOBLIT2_R)

    # Zaoblit3
    # the kernel refuses this fillet: 4 mm, written as the material it takes off along each edge
    with BuildSketch(Plane(origin=(8, 61, -104), x_dir=(1, 0, 0), z_dir=(0, 0, 1)), Plane(origin=(92, 61, -33), x_dir=(-1, 0, 0), z_dir=(0, 0, -1))) as zaoblit3_piece_1:
        with BuildLine():
            CenterArc((ZAOBLIT3_R, -ZAOBLIT3_R), ZAOBLIT3_R, 90, 90)
            Line((0, -ZAOBLIT3_R), (0, 0))
            Line((0, 0), (ZAOBLIT3_R, 0))
        make_face()
    extrude(amount=71, mode=Mode.SUBTRACT)
    with BuildSketch(Plane(origin=(100, 57, -10), x_dir=(-1, 0, 0), z_dir=(0, 0, -1)), Plane(origin=(0, 57, -38), x_dir=(1, 0, 0), z_dir=(0, 0, 1))) as zaoblit3_piece_2:
        with BuildLine():
            CenterArc((ZAOBLIT3_R, -ZAOBLIT3_R), ZAOBLIT3_R, 90, 90)
            Line((0, -ZAOBLIT3_R), (0, 0))
            Line((0, 0), (ZAOBLIT3_R, 0))
        make_face()
    extrude(amount=28, mode=Mode.SUBTRACT)
    with BuildSketch(Plane(origin=(100, 57, -33), x_dir=(0, -1, 0), z_dir=(0, 0, -1)), Plane(origin=(0, 57, -110), x_dir=(0, -1, 0), z_dir=(0, 0, 1))) as zaoblit3_piece_3:
        with BuildLine():
            CenterArc((ZAOBLIT3_R, ZAOBLIT3_R), ZAOBLIT3_R, 180, 90)
            Line((0, ZAOBLIT3_R), (0, 0))
            Line((0, 0), (ZAOBLIT3_R, 0))
        make_face()
    extrude(amount=77, mode=Mode.SUBTRACT)
    with BuildSketch(Plane(origin=(10, 57, 0), x_dir=(0, 0, -1), z_dir=(1, 0, 0)), Plane(origin=(90, 57, -120), x_dir=(0, 0, 1), z_dir=(-1, 0, 0))) as zaoblit3_piece_4:
        with BuildLine():
            CenterArc((ZAOBLIT3_R, -ZAOBLIT3_R), ZAOBLIT3_R, 90, 90)
            Line((0, -ZAOBLIT3_R), (0, 0))
            Line((0, 0), (ZAOBLIT3_R, 0))
        make_face()
    extrude(amount=80, mode=Mode.SUBTRACT)
    with BuildSketch(Plane(origin=(10, 57, -10), x_dir=(0, 0, 1), z_dir=(1, 0, 0))) as zaoblit3_piece_5:
        with BuildLine():
            CenterArc((10 - ZAOBLIT3_R, ZAOBLIT3_R), ZAOBLIT3_R, 270, 90)
            Line((10, ZAOBLIT3_R), (10, 0))
            Line((10, 0), (10 - ZAOBLIT3_R, 0))
        make_face()
    revolve(axis=Axis((10, 57, -10), (0, -1, 0)), revolution_arc=90, mode=Mode.SUBTRACT)
    with BuildSketch(Plane(origin=(90, 57, -10), x_dir=(0, 0, 1), z_dir=(-1, 0, 0))) as zaoblit3_piece_6:
        with BuildLine():
            CenterArc((10 - ZAOBLIT3_R, -ZAOBLIT3_R), ZAOBLIT3_R, 0, 90)
            Line((10, -ZAOBLIT3_R), (10, 0))
            Line((10, 0), (10 - ZAOBLIT3_R, 0))
        make_face()
    revolve(axis=Axis((90, 57, -10), (0, 1, 0)), revolution_arc=90, mode=Mode.SUBTRACT)
    with BuildSketch(Plane(origin=(10, 57, -110), x_dir=(0, 0, -1), z_dir=(1, 0, 0))) as zaoblit3_piece_7:
        with BuildLine():
            CenterArc((10 - ZAOBLIT3_R, -ZAOBLIT3_R), ZAOBLIT3_R, 0, 90)
            Line((10, -ZAOBLIT3_R), (10, 0))
            Line((10, 0), (10 - ZAOBLIT3_R, 0))
        make_face()
    revolve(axis=Axis((10, 57, -110), (0, 1, 0)), revolution_arc=90, mode=Mode.SUBTRACT)
    with BuildSketch(Plane(origin=(90, 57, -110), x_dir=(0, 0, -1), z_dir=(-1, 0, 0))) as zaoblit3_piece_8:
        with BuildLine():
            CenterArc((10 - ZAOBLIT3_R, ZAOBLIT3_R), ZAOBLIT3_R, 270, 90)
            Line((10, ZAOBLIT3_R), (10, 0))
            Line((10, 0), (10 - ZAOBLIT3_R, 0))
        make_face()
    revolve(axis=Axis((90, 57, -110), (0, -1, 0)), revolution_arc=90, mode=Mode.SUBTRACT)
    with BuildSketch(Plane(origin=(16, 61, -8), x_dir=(0, -1, 0), z_dir=(1, 0, 0))) as zaoblit3_piece_9:
        with BuildLine():
            CenterArc((ZAOBLIT3_R, ZAOBLIT3_R), ZAOBLIT3_R, 180, 90)
            Line((0, ZAOBLIT3_R), (0, 0))
            Line((0, 0), (ZAOBLIT3_R, 0))
        make_face()
    extrude(amount=68, mode=Mode.SUBTRACT)
    with BuildSketch(Plane(origin=(84, 61, -112), x_dir=(0, 0, 1), z_dir=(-1, 0, 0))) as zaoblit3_piece_10:
        with BuildLine():
            CenterArc((ZAOBLIT3_R, -ZAOBLIT3_R), ZAOBLIT3_R, 90, 90)
            Line((0, -ZAOBLIT3_R), (0, 0))
            Line((0, 0), (ZAOBLIT3_R, 0))
        make_face()
    extrude(amount=68, mode=Mode.SUBTRACT)
    with BuildSketch(Plane(origin=(84, 61, -16), x_dir=(0, 0, 1), z_dir=(-1, 0, 0))) as zaoblit3_piece_11:
        with BuildLine():
            CenterArc((8 - ZAOBLIT3_R, -ZAOBLIT3_R), ZAOBLIT3_R, 0, 90)
            Line((8 - ZAOBLIT3_R, 0), (8, 0))
            Line((8, 0), (8, -ZAOBLIT3_R))
        make_face()
    revolve(axis=Axis((84, 61, -16), (0, 1, 0)), revolution_arc=90, mode=Mode.SUBTRACT)
    with BuildSketch(Plane(origin=(84, 61, -104), x_dir=(0, 0, -1), z_dir=(-1, 0, 0))) as zaoblit3_piece_12:
        with BuildLine():
            CenterArc((8 - ZAOBLIT3_R, ZAOBLIT3_R), ZAOBLIT3_R, 270, 90)
            Line((8, ZAOBLIT3_R), (8, 0))
            Line((8, 0), (8 - ZAOBLIT3_R, 0))
        make_face()
    revolve(axis=Axis((84, 61, -104), (0, -1, 0)), revolution_arc=90, mode=Mode.SUBTRACT)
    with BuildSketch(Plane(origin=(16, 61, -104), x_dir=(-1, 0, 0), z_dir=(0, 0, 1))) as zaoblit3_piece_13:
        with BuildLine():
            CenterArc((8 - ZAOBLIT3_R, ZAOBLIT3_R), ZAOBLIT3_R, 270, 90)
            Line((8, ZAOBLIT3_R), (8, 0))
            Line((8, 0), (8 - ZAOBLIT3_R, 0))
        make_face()
    revolve(axis=Axis((16, 61, -104), (0, -1, 0)), revolution_arc=90, mode=Mode.SUBTRACT)
    with BuildSketch(Plane(origin=(16, 61, -16), x_dir=(-1, 0, 0), z_dir=(0, 0, -1))) as zaoblit3_piece_14:
        with BuildLine():
            CenterArc((8 - ZAOBLIT3_R, -ZAOBLIT3_R), ZAOBLIT3_R, 0, 90)
            Line((8 - ZAOBLIT3_R, 0), (8, 0))
            Line((8, 0), (8, -ZAOBLIT3_R))
        make_face()
    revolve(axis=Axis((16, 61, -16), (0, 1, 0)), revolution_arc=90, mode=Mode.SUBTRACT)
    with BuildSketch(Plane(origin=(8, 61, -38), x_dir=(0, -1, 0), z_dir=(0, 0, 1)), Plane(origin=(92, 61, -16), x_dir=(0, -1, 0), z_dir=(0, 0, -1))) as zaoblit3_piece_15:
        with BuildLine():
            CenterArc((ZAOBLIT3_R, ZAOBLIT3_R), ZAOBLIT3_R, 180, 90)
            Line((0, ZAOBLIT3_R), (0, 0))
            Line((0, 0), (ZAOBLIT3_R, 0))
        make_face()
    extrude(amount=22, mode=Mode.SUBTRACT)


solid = part.part
